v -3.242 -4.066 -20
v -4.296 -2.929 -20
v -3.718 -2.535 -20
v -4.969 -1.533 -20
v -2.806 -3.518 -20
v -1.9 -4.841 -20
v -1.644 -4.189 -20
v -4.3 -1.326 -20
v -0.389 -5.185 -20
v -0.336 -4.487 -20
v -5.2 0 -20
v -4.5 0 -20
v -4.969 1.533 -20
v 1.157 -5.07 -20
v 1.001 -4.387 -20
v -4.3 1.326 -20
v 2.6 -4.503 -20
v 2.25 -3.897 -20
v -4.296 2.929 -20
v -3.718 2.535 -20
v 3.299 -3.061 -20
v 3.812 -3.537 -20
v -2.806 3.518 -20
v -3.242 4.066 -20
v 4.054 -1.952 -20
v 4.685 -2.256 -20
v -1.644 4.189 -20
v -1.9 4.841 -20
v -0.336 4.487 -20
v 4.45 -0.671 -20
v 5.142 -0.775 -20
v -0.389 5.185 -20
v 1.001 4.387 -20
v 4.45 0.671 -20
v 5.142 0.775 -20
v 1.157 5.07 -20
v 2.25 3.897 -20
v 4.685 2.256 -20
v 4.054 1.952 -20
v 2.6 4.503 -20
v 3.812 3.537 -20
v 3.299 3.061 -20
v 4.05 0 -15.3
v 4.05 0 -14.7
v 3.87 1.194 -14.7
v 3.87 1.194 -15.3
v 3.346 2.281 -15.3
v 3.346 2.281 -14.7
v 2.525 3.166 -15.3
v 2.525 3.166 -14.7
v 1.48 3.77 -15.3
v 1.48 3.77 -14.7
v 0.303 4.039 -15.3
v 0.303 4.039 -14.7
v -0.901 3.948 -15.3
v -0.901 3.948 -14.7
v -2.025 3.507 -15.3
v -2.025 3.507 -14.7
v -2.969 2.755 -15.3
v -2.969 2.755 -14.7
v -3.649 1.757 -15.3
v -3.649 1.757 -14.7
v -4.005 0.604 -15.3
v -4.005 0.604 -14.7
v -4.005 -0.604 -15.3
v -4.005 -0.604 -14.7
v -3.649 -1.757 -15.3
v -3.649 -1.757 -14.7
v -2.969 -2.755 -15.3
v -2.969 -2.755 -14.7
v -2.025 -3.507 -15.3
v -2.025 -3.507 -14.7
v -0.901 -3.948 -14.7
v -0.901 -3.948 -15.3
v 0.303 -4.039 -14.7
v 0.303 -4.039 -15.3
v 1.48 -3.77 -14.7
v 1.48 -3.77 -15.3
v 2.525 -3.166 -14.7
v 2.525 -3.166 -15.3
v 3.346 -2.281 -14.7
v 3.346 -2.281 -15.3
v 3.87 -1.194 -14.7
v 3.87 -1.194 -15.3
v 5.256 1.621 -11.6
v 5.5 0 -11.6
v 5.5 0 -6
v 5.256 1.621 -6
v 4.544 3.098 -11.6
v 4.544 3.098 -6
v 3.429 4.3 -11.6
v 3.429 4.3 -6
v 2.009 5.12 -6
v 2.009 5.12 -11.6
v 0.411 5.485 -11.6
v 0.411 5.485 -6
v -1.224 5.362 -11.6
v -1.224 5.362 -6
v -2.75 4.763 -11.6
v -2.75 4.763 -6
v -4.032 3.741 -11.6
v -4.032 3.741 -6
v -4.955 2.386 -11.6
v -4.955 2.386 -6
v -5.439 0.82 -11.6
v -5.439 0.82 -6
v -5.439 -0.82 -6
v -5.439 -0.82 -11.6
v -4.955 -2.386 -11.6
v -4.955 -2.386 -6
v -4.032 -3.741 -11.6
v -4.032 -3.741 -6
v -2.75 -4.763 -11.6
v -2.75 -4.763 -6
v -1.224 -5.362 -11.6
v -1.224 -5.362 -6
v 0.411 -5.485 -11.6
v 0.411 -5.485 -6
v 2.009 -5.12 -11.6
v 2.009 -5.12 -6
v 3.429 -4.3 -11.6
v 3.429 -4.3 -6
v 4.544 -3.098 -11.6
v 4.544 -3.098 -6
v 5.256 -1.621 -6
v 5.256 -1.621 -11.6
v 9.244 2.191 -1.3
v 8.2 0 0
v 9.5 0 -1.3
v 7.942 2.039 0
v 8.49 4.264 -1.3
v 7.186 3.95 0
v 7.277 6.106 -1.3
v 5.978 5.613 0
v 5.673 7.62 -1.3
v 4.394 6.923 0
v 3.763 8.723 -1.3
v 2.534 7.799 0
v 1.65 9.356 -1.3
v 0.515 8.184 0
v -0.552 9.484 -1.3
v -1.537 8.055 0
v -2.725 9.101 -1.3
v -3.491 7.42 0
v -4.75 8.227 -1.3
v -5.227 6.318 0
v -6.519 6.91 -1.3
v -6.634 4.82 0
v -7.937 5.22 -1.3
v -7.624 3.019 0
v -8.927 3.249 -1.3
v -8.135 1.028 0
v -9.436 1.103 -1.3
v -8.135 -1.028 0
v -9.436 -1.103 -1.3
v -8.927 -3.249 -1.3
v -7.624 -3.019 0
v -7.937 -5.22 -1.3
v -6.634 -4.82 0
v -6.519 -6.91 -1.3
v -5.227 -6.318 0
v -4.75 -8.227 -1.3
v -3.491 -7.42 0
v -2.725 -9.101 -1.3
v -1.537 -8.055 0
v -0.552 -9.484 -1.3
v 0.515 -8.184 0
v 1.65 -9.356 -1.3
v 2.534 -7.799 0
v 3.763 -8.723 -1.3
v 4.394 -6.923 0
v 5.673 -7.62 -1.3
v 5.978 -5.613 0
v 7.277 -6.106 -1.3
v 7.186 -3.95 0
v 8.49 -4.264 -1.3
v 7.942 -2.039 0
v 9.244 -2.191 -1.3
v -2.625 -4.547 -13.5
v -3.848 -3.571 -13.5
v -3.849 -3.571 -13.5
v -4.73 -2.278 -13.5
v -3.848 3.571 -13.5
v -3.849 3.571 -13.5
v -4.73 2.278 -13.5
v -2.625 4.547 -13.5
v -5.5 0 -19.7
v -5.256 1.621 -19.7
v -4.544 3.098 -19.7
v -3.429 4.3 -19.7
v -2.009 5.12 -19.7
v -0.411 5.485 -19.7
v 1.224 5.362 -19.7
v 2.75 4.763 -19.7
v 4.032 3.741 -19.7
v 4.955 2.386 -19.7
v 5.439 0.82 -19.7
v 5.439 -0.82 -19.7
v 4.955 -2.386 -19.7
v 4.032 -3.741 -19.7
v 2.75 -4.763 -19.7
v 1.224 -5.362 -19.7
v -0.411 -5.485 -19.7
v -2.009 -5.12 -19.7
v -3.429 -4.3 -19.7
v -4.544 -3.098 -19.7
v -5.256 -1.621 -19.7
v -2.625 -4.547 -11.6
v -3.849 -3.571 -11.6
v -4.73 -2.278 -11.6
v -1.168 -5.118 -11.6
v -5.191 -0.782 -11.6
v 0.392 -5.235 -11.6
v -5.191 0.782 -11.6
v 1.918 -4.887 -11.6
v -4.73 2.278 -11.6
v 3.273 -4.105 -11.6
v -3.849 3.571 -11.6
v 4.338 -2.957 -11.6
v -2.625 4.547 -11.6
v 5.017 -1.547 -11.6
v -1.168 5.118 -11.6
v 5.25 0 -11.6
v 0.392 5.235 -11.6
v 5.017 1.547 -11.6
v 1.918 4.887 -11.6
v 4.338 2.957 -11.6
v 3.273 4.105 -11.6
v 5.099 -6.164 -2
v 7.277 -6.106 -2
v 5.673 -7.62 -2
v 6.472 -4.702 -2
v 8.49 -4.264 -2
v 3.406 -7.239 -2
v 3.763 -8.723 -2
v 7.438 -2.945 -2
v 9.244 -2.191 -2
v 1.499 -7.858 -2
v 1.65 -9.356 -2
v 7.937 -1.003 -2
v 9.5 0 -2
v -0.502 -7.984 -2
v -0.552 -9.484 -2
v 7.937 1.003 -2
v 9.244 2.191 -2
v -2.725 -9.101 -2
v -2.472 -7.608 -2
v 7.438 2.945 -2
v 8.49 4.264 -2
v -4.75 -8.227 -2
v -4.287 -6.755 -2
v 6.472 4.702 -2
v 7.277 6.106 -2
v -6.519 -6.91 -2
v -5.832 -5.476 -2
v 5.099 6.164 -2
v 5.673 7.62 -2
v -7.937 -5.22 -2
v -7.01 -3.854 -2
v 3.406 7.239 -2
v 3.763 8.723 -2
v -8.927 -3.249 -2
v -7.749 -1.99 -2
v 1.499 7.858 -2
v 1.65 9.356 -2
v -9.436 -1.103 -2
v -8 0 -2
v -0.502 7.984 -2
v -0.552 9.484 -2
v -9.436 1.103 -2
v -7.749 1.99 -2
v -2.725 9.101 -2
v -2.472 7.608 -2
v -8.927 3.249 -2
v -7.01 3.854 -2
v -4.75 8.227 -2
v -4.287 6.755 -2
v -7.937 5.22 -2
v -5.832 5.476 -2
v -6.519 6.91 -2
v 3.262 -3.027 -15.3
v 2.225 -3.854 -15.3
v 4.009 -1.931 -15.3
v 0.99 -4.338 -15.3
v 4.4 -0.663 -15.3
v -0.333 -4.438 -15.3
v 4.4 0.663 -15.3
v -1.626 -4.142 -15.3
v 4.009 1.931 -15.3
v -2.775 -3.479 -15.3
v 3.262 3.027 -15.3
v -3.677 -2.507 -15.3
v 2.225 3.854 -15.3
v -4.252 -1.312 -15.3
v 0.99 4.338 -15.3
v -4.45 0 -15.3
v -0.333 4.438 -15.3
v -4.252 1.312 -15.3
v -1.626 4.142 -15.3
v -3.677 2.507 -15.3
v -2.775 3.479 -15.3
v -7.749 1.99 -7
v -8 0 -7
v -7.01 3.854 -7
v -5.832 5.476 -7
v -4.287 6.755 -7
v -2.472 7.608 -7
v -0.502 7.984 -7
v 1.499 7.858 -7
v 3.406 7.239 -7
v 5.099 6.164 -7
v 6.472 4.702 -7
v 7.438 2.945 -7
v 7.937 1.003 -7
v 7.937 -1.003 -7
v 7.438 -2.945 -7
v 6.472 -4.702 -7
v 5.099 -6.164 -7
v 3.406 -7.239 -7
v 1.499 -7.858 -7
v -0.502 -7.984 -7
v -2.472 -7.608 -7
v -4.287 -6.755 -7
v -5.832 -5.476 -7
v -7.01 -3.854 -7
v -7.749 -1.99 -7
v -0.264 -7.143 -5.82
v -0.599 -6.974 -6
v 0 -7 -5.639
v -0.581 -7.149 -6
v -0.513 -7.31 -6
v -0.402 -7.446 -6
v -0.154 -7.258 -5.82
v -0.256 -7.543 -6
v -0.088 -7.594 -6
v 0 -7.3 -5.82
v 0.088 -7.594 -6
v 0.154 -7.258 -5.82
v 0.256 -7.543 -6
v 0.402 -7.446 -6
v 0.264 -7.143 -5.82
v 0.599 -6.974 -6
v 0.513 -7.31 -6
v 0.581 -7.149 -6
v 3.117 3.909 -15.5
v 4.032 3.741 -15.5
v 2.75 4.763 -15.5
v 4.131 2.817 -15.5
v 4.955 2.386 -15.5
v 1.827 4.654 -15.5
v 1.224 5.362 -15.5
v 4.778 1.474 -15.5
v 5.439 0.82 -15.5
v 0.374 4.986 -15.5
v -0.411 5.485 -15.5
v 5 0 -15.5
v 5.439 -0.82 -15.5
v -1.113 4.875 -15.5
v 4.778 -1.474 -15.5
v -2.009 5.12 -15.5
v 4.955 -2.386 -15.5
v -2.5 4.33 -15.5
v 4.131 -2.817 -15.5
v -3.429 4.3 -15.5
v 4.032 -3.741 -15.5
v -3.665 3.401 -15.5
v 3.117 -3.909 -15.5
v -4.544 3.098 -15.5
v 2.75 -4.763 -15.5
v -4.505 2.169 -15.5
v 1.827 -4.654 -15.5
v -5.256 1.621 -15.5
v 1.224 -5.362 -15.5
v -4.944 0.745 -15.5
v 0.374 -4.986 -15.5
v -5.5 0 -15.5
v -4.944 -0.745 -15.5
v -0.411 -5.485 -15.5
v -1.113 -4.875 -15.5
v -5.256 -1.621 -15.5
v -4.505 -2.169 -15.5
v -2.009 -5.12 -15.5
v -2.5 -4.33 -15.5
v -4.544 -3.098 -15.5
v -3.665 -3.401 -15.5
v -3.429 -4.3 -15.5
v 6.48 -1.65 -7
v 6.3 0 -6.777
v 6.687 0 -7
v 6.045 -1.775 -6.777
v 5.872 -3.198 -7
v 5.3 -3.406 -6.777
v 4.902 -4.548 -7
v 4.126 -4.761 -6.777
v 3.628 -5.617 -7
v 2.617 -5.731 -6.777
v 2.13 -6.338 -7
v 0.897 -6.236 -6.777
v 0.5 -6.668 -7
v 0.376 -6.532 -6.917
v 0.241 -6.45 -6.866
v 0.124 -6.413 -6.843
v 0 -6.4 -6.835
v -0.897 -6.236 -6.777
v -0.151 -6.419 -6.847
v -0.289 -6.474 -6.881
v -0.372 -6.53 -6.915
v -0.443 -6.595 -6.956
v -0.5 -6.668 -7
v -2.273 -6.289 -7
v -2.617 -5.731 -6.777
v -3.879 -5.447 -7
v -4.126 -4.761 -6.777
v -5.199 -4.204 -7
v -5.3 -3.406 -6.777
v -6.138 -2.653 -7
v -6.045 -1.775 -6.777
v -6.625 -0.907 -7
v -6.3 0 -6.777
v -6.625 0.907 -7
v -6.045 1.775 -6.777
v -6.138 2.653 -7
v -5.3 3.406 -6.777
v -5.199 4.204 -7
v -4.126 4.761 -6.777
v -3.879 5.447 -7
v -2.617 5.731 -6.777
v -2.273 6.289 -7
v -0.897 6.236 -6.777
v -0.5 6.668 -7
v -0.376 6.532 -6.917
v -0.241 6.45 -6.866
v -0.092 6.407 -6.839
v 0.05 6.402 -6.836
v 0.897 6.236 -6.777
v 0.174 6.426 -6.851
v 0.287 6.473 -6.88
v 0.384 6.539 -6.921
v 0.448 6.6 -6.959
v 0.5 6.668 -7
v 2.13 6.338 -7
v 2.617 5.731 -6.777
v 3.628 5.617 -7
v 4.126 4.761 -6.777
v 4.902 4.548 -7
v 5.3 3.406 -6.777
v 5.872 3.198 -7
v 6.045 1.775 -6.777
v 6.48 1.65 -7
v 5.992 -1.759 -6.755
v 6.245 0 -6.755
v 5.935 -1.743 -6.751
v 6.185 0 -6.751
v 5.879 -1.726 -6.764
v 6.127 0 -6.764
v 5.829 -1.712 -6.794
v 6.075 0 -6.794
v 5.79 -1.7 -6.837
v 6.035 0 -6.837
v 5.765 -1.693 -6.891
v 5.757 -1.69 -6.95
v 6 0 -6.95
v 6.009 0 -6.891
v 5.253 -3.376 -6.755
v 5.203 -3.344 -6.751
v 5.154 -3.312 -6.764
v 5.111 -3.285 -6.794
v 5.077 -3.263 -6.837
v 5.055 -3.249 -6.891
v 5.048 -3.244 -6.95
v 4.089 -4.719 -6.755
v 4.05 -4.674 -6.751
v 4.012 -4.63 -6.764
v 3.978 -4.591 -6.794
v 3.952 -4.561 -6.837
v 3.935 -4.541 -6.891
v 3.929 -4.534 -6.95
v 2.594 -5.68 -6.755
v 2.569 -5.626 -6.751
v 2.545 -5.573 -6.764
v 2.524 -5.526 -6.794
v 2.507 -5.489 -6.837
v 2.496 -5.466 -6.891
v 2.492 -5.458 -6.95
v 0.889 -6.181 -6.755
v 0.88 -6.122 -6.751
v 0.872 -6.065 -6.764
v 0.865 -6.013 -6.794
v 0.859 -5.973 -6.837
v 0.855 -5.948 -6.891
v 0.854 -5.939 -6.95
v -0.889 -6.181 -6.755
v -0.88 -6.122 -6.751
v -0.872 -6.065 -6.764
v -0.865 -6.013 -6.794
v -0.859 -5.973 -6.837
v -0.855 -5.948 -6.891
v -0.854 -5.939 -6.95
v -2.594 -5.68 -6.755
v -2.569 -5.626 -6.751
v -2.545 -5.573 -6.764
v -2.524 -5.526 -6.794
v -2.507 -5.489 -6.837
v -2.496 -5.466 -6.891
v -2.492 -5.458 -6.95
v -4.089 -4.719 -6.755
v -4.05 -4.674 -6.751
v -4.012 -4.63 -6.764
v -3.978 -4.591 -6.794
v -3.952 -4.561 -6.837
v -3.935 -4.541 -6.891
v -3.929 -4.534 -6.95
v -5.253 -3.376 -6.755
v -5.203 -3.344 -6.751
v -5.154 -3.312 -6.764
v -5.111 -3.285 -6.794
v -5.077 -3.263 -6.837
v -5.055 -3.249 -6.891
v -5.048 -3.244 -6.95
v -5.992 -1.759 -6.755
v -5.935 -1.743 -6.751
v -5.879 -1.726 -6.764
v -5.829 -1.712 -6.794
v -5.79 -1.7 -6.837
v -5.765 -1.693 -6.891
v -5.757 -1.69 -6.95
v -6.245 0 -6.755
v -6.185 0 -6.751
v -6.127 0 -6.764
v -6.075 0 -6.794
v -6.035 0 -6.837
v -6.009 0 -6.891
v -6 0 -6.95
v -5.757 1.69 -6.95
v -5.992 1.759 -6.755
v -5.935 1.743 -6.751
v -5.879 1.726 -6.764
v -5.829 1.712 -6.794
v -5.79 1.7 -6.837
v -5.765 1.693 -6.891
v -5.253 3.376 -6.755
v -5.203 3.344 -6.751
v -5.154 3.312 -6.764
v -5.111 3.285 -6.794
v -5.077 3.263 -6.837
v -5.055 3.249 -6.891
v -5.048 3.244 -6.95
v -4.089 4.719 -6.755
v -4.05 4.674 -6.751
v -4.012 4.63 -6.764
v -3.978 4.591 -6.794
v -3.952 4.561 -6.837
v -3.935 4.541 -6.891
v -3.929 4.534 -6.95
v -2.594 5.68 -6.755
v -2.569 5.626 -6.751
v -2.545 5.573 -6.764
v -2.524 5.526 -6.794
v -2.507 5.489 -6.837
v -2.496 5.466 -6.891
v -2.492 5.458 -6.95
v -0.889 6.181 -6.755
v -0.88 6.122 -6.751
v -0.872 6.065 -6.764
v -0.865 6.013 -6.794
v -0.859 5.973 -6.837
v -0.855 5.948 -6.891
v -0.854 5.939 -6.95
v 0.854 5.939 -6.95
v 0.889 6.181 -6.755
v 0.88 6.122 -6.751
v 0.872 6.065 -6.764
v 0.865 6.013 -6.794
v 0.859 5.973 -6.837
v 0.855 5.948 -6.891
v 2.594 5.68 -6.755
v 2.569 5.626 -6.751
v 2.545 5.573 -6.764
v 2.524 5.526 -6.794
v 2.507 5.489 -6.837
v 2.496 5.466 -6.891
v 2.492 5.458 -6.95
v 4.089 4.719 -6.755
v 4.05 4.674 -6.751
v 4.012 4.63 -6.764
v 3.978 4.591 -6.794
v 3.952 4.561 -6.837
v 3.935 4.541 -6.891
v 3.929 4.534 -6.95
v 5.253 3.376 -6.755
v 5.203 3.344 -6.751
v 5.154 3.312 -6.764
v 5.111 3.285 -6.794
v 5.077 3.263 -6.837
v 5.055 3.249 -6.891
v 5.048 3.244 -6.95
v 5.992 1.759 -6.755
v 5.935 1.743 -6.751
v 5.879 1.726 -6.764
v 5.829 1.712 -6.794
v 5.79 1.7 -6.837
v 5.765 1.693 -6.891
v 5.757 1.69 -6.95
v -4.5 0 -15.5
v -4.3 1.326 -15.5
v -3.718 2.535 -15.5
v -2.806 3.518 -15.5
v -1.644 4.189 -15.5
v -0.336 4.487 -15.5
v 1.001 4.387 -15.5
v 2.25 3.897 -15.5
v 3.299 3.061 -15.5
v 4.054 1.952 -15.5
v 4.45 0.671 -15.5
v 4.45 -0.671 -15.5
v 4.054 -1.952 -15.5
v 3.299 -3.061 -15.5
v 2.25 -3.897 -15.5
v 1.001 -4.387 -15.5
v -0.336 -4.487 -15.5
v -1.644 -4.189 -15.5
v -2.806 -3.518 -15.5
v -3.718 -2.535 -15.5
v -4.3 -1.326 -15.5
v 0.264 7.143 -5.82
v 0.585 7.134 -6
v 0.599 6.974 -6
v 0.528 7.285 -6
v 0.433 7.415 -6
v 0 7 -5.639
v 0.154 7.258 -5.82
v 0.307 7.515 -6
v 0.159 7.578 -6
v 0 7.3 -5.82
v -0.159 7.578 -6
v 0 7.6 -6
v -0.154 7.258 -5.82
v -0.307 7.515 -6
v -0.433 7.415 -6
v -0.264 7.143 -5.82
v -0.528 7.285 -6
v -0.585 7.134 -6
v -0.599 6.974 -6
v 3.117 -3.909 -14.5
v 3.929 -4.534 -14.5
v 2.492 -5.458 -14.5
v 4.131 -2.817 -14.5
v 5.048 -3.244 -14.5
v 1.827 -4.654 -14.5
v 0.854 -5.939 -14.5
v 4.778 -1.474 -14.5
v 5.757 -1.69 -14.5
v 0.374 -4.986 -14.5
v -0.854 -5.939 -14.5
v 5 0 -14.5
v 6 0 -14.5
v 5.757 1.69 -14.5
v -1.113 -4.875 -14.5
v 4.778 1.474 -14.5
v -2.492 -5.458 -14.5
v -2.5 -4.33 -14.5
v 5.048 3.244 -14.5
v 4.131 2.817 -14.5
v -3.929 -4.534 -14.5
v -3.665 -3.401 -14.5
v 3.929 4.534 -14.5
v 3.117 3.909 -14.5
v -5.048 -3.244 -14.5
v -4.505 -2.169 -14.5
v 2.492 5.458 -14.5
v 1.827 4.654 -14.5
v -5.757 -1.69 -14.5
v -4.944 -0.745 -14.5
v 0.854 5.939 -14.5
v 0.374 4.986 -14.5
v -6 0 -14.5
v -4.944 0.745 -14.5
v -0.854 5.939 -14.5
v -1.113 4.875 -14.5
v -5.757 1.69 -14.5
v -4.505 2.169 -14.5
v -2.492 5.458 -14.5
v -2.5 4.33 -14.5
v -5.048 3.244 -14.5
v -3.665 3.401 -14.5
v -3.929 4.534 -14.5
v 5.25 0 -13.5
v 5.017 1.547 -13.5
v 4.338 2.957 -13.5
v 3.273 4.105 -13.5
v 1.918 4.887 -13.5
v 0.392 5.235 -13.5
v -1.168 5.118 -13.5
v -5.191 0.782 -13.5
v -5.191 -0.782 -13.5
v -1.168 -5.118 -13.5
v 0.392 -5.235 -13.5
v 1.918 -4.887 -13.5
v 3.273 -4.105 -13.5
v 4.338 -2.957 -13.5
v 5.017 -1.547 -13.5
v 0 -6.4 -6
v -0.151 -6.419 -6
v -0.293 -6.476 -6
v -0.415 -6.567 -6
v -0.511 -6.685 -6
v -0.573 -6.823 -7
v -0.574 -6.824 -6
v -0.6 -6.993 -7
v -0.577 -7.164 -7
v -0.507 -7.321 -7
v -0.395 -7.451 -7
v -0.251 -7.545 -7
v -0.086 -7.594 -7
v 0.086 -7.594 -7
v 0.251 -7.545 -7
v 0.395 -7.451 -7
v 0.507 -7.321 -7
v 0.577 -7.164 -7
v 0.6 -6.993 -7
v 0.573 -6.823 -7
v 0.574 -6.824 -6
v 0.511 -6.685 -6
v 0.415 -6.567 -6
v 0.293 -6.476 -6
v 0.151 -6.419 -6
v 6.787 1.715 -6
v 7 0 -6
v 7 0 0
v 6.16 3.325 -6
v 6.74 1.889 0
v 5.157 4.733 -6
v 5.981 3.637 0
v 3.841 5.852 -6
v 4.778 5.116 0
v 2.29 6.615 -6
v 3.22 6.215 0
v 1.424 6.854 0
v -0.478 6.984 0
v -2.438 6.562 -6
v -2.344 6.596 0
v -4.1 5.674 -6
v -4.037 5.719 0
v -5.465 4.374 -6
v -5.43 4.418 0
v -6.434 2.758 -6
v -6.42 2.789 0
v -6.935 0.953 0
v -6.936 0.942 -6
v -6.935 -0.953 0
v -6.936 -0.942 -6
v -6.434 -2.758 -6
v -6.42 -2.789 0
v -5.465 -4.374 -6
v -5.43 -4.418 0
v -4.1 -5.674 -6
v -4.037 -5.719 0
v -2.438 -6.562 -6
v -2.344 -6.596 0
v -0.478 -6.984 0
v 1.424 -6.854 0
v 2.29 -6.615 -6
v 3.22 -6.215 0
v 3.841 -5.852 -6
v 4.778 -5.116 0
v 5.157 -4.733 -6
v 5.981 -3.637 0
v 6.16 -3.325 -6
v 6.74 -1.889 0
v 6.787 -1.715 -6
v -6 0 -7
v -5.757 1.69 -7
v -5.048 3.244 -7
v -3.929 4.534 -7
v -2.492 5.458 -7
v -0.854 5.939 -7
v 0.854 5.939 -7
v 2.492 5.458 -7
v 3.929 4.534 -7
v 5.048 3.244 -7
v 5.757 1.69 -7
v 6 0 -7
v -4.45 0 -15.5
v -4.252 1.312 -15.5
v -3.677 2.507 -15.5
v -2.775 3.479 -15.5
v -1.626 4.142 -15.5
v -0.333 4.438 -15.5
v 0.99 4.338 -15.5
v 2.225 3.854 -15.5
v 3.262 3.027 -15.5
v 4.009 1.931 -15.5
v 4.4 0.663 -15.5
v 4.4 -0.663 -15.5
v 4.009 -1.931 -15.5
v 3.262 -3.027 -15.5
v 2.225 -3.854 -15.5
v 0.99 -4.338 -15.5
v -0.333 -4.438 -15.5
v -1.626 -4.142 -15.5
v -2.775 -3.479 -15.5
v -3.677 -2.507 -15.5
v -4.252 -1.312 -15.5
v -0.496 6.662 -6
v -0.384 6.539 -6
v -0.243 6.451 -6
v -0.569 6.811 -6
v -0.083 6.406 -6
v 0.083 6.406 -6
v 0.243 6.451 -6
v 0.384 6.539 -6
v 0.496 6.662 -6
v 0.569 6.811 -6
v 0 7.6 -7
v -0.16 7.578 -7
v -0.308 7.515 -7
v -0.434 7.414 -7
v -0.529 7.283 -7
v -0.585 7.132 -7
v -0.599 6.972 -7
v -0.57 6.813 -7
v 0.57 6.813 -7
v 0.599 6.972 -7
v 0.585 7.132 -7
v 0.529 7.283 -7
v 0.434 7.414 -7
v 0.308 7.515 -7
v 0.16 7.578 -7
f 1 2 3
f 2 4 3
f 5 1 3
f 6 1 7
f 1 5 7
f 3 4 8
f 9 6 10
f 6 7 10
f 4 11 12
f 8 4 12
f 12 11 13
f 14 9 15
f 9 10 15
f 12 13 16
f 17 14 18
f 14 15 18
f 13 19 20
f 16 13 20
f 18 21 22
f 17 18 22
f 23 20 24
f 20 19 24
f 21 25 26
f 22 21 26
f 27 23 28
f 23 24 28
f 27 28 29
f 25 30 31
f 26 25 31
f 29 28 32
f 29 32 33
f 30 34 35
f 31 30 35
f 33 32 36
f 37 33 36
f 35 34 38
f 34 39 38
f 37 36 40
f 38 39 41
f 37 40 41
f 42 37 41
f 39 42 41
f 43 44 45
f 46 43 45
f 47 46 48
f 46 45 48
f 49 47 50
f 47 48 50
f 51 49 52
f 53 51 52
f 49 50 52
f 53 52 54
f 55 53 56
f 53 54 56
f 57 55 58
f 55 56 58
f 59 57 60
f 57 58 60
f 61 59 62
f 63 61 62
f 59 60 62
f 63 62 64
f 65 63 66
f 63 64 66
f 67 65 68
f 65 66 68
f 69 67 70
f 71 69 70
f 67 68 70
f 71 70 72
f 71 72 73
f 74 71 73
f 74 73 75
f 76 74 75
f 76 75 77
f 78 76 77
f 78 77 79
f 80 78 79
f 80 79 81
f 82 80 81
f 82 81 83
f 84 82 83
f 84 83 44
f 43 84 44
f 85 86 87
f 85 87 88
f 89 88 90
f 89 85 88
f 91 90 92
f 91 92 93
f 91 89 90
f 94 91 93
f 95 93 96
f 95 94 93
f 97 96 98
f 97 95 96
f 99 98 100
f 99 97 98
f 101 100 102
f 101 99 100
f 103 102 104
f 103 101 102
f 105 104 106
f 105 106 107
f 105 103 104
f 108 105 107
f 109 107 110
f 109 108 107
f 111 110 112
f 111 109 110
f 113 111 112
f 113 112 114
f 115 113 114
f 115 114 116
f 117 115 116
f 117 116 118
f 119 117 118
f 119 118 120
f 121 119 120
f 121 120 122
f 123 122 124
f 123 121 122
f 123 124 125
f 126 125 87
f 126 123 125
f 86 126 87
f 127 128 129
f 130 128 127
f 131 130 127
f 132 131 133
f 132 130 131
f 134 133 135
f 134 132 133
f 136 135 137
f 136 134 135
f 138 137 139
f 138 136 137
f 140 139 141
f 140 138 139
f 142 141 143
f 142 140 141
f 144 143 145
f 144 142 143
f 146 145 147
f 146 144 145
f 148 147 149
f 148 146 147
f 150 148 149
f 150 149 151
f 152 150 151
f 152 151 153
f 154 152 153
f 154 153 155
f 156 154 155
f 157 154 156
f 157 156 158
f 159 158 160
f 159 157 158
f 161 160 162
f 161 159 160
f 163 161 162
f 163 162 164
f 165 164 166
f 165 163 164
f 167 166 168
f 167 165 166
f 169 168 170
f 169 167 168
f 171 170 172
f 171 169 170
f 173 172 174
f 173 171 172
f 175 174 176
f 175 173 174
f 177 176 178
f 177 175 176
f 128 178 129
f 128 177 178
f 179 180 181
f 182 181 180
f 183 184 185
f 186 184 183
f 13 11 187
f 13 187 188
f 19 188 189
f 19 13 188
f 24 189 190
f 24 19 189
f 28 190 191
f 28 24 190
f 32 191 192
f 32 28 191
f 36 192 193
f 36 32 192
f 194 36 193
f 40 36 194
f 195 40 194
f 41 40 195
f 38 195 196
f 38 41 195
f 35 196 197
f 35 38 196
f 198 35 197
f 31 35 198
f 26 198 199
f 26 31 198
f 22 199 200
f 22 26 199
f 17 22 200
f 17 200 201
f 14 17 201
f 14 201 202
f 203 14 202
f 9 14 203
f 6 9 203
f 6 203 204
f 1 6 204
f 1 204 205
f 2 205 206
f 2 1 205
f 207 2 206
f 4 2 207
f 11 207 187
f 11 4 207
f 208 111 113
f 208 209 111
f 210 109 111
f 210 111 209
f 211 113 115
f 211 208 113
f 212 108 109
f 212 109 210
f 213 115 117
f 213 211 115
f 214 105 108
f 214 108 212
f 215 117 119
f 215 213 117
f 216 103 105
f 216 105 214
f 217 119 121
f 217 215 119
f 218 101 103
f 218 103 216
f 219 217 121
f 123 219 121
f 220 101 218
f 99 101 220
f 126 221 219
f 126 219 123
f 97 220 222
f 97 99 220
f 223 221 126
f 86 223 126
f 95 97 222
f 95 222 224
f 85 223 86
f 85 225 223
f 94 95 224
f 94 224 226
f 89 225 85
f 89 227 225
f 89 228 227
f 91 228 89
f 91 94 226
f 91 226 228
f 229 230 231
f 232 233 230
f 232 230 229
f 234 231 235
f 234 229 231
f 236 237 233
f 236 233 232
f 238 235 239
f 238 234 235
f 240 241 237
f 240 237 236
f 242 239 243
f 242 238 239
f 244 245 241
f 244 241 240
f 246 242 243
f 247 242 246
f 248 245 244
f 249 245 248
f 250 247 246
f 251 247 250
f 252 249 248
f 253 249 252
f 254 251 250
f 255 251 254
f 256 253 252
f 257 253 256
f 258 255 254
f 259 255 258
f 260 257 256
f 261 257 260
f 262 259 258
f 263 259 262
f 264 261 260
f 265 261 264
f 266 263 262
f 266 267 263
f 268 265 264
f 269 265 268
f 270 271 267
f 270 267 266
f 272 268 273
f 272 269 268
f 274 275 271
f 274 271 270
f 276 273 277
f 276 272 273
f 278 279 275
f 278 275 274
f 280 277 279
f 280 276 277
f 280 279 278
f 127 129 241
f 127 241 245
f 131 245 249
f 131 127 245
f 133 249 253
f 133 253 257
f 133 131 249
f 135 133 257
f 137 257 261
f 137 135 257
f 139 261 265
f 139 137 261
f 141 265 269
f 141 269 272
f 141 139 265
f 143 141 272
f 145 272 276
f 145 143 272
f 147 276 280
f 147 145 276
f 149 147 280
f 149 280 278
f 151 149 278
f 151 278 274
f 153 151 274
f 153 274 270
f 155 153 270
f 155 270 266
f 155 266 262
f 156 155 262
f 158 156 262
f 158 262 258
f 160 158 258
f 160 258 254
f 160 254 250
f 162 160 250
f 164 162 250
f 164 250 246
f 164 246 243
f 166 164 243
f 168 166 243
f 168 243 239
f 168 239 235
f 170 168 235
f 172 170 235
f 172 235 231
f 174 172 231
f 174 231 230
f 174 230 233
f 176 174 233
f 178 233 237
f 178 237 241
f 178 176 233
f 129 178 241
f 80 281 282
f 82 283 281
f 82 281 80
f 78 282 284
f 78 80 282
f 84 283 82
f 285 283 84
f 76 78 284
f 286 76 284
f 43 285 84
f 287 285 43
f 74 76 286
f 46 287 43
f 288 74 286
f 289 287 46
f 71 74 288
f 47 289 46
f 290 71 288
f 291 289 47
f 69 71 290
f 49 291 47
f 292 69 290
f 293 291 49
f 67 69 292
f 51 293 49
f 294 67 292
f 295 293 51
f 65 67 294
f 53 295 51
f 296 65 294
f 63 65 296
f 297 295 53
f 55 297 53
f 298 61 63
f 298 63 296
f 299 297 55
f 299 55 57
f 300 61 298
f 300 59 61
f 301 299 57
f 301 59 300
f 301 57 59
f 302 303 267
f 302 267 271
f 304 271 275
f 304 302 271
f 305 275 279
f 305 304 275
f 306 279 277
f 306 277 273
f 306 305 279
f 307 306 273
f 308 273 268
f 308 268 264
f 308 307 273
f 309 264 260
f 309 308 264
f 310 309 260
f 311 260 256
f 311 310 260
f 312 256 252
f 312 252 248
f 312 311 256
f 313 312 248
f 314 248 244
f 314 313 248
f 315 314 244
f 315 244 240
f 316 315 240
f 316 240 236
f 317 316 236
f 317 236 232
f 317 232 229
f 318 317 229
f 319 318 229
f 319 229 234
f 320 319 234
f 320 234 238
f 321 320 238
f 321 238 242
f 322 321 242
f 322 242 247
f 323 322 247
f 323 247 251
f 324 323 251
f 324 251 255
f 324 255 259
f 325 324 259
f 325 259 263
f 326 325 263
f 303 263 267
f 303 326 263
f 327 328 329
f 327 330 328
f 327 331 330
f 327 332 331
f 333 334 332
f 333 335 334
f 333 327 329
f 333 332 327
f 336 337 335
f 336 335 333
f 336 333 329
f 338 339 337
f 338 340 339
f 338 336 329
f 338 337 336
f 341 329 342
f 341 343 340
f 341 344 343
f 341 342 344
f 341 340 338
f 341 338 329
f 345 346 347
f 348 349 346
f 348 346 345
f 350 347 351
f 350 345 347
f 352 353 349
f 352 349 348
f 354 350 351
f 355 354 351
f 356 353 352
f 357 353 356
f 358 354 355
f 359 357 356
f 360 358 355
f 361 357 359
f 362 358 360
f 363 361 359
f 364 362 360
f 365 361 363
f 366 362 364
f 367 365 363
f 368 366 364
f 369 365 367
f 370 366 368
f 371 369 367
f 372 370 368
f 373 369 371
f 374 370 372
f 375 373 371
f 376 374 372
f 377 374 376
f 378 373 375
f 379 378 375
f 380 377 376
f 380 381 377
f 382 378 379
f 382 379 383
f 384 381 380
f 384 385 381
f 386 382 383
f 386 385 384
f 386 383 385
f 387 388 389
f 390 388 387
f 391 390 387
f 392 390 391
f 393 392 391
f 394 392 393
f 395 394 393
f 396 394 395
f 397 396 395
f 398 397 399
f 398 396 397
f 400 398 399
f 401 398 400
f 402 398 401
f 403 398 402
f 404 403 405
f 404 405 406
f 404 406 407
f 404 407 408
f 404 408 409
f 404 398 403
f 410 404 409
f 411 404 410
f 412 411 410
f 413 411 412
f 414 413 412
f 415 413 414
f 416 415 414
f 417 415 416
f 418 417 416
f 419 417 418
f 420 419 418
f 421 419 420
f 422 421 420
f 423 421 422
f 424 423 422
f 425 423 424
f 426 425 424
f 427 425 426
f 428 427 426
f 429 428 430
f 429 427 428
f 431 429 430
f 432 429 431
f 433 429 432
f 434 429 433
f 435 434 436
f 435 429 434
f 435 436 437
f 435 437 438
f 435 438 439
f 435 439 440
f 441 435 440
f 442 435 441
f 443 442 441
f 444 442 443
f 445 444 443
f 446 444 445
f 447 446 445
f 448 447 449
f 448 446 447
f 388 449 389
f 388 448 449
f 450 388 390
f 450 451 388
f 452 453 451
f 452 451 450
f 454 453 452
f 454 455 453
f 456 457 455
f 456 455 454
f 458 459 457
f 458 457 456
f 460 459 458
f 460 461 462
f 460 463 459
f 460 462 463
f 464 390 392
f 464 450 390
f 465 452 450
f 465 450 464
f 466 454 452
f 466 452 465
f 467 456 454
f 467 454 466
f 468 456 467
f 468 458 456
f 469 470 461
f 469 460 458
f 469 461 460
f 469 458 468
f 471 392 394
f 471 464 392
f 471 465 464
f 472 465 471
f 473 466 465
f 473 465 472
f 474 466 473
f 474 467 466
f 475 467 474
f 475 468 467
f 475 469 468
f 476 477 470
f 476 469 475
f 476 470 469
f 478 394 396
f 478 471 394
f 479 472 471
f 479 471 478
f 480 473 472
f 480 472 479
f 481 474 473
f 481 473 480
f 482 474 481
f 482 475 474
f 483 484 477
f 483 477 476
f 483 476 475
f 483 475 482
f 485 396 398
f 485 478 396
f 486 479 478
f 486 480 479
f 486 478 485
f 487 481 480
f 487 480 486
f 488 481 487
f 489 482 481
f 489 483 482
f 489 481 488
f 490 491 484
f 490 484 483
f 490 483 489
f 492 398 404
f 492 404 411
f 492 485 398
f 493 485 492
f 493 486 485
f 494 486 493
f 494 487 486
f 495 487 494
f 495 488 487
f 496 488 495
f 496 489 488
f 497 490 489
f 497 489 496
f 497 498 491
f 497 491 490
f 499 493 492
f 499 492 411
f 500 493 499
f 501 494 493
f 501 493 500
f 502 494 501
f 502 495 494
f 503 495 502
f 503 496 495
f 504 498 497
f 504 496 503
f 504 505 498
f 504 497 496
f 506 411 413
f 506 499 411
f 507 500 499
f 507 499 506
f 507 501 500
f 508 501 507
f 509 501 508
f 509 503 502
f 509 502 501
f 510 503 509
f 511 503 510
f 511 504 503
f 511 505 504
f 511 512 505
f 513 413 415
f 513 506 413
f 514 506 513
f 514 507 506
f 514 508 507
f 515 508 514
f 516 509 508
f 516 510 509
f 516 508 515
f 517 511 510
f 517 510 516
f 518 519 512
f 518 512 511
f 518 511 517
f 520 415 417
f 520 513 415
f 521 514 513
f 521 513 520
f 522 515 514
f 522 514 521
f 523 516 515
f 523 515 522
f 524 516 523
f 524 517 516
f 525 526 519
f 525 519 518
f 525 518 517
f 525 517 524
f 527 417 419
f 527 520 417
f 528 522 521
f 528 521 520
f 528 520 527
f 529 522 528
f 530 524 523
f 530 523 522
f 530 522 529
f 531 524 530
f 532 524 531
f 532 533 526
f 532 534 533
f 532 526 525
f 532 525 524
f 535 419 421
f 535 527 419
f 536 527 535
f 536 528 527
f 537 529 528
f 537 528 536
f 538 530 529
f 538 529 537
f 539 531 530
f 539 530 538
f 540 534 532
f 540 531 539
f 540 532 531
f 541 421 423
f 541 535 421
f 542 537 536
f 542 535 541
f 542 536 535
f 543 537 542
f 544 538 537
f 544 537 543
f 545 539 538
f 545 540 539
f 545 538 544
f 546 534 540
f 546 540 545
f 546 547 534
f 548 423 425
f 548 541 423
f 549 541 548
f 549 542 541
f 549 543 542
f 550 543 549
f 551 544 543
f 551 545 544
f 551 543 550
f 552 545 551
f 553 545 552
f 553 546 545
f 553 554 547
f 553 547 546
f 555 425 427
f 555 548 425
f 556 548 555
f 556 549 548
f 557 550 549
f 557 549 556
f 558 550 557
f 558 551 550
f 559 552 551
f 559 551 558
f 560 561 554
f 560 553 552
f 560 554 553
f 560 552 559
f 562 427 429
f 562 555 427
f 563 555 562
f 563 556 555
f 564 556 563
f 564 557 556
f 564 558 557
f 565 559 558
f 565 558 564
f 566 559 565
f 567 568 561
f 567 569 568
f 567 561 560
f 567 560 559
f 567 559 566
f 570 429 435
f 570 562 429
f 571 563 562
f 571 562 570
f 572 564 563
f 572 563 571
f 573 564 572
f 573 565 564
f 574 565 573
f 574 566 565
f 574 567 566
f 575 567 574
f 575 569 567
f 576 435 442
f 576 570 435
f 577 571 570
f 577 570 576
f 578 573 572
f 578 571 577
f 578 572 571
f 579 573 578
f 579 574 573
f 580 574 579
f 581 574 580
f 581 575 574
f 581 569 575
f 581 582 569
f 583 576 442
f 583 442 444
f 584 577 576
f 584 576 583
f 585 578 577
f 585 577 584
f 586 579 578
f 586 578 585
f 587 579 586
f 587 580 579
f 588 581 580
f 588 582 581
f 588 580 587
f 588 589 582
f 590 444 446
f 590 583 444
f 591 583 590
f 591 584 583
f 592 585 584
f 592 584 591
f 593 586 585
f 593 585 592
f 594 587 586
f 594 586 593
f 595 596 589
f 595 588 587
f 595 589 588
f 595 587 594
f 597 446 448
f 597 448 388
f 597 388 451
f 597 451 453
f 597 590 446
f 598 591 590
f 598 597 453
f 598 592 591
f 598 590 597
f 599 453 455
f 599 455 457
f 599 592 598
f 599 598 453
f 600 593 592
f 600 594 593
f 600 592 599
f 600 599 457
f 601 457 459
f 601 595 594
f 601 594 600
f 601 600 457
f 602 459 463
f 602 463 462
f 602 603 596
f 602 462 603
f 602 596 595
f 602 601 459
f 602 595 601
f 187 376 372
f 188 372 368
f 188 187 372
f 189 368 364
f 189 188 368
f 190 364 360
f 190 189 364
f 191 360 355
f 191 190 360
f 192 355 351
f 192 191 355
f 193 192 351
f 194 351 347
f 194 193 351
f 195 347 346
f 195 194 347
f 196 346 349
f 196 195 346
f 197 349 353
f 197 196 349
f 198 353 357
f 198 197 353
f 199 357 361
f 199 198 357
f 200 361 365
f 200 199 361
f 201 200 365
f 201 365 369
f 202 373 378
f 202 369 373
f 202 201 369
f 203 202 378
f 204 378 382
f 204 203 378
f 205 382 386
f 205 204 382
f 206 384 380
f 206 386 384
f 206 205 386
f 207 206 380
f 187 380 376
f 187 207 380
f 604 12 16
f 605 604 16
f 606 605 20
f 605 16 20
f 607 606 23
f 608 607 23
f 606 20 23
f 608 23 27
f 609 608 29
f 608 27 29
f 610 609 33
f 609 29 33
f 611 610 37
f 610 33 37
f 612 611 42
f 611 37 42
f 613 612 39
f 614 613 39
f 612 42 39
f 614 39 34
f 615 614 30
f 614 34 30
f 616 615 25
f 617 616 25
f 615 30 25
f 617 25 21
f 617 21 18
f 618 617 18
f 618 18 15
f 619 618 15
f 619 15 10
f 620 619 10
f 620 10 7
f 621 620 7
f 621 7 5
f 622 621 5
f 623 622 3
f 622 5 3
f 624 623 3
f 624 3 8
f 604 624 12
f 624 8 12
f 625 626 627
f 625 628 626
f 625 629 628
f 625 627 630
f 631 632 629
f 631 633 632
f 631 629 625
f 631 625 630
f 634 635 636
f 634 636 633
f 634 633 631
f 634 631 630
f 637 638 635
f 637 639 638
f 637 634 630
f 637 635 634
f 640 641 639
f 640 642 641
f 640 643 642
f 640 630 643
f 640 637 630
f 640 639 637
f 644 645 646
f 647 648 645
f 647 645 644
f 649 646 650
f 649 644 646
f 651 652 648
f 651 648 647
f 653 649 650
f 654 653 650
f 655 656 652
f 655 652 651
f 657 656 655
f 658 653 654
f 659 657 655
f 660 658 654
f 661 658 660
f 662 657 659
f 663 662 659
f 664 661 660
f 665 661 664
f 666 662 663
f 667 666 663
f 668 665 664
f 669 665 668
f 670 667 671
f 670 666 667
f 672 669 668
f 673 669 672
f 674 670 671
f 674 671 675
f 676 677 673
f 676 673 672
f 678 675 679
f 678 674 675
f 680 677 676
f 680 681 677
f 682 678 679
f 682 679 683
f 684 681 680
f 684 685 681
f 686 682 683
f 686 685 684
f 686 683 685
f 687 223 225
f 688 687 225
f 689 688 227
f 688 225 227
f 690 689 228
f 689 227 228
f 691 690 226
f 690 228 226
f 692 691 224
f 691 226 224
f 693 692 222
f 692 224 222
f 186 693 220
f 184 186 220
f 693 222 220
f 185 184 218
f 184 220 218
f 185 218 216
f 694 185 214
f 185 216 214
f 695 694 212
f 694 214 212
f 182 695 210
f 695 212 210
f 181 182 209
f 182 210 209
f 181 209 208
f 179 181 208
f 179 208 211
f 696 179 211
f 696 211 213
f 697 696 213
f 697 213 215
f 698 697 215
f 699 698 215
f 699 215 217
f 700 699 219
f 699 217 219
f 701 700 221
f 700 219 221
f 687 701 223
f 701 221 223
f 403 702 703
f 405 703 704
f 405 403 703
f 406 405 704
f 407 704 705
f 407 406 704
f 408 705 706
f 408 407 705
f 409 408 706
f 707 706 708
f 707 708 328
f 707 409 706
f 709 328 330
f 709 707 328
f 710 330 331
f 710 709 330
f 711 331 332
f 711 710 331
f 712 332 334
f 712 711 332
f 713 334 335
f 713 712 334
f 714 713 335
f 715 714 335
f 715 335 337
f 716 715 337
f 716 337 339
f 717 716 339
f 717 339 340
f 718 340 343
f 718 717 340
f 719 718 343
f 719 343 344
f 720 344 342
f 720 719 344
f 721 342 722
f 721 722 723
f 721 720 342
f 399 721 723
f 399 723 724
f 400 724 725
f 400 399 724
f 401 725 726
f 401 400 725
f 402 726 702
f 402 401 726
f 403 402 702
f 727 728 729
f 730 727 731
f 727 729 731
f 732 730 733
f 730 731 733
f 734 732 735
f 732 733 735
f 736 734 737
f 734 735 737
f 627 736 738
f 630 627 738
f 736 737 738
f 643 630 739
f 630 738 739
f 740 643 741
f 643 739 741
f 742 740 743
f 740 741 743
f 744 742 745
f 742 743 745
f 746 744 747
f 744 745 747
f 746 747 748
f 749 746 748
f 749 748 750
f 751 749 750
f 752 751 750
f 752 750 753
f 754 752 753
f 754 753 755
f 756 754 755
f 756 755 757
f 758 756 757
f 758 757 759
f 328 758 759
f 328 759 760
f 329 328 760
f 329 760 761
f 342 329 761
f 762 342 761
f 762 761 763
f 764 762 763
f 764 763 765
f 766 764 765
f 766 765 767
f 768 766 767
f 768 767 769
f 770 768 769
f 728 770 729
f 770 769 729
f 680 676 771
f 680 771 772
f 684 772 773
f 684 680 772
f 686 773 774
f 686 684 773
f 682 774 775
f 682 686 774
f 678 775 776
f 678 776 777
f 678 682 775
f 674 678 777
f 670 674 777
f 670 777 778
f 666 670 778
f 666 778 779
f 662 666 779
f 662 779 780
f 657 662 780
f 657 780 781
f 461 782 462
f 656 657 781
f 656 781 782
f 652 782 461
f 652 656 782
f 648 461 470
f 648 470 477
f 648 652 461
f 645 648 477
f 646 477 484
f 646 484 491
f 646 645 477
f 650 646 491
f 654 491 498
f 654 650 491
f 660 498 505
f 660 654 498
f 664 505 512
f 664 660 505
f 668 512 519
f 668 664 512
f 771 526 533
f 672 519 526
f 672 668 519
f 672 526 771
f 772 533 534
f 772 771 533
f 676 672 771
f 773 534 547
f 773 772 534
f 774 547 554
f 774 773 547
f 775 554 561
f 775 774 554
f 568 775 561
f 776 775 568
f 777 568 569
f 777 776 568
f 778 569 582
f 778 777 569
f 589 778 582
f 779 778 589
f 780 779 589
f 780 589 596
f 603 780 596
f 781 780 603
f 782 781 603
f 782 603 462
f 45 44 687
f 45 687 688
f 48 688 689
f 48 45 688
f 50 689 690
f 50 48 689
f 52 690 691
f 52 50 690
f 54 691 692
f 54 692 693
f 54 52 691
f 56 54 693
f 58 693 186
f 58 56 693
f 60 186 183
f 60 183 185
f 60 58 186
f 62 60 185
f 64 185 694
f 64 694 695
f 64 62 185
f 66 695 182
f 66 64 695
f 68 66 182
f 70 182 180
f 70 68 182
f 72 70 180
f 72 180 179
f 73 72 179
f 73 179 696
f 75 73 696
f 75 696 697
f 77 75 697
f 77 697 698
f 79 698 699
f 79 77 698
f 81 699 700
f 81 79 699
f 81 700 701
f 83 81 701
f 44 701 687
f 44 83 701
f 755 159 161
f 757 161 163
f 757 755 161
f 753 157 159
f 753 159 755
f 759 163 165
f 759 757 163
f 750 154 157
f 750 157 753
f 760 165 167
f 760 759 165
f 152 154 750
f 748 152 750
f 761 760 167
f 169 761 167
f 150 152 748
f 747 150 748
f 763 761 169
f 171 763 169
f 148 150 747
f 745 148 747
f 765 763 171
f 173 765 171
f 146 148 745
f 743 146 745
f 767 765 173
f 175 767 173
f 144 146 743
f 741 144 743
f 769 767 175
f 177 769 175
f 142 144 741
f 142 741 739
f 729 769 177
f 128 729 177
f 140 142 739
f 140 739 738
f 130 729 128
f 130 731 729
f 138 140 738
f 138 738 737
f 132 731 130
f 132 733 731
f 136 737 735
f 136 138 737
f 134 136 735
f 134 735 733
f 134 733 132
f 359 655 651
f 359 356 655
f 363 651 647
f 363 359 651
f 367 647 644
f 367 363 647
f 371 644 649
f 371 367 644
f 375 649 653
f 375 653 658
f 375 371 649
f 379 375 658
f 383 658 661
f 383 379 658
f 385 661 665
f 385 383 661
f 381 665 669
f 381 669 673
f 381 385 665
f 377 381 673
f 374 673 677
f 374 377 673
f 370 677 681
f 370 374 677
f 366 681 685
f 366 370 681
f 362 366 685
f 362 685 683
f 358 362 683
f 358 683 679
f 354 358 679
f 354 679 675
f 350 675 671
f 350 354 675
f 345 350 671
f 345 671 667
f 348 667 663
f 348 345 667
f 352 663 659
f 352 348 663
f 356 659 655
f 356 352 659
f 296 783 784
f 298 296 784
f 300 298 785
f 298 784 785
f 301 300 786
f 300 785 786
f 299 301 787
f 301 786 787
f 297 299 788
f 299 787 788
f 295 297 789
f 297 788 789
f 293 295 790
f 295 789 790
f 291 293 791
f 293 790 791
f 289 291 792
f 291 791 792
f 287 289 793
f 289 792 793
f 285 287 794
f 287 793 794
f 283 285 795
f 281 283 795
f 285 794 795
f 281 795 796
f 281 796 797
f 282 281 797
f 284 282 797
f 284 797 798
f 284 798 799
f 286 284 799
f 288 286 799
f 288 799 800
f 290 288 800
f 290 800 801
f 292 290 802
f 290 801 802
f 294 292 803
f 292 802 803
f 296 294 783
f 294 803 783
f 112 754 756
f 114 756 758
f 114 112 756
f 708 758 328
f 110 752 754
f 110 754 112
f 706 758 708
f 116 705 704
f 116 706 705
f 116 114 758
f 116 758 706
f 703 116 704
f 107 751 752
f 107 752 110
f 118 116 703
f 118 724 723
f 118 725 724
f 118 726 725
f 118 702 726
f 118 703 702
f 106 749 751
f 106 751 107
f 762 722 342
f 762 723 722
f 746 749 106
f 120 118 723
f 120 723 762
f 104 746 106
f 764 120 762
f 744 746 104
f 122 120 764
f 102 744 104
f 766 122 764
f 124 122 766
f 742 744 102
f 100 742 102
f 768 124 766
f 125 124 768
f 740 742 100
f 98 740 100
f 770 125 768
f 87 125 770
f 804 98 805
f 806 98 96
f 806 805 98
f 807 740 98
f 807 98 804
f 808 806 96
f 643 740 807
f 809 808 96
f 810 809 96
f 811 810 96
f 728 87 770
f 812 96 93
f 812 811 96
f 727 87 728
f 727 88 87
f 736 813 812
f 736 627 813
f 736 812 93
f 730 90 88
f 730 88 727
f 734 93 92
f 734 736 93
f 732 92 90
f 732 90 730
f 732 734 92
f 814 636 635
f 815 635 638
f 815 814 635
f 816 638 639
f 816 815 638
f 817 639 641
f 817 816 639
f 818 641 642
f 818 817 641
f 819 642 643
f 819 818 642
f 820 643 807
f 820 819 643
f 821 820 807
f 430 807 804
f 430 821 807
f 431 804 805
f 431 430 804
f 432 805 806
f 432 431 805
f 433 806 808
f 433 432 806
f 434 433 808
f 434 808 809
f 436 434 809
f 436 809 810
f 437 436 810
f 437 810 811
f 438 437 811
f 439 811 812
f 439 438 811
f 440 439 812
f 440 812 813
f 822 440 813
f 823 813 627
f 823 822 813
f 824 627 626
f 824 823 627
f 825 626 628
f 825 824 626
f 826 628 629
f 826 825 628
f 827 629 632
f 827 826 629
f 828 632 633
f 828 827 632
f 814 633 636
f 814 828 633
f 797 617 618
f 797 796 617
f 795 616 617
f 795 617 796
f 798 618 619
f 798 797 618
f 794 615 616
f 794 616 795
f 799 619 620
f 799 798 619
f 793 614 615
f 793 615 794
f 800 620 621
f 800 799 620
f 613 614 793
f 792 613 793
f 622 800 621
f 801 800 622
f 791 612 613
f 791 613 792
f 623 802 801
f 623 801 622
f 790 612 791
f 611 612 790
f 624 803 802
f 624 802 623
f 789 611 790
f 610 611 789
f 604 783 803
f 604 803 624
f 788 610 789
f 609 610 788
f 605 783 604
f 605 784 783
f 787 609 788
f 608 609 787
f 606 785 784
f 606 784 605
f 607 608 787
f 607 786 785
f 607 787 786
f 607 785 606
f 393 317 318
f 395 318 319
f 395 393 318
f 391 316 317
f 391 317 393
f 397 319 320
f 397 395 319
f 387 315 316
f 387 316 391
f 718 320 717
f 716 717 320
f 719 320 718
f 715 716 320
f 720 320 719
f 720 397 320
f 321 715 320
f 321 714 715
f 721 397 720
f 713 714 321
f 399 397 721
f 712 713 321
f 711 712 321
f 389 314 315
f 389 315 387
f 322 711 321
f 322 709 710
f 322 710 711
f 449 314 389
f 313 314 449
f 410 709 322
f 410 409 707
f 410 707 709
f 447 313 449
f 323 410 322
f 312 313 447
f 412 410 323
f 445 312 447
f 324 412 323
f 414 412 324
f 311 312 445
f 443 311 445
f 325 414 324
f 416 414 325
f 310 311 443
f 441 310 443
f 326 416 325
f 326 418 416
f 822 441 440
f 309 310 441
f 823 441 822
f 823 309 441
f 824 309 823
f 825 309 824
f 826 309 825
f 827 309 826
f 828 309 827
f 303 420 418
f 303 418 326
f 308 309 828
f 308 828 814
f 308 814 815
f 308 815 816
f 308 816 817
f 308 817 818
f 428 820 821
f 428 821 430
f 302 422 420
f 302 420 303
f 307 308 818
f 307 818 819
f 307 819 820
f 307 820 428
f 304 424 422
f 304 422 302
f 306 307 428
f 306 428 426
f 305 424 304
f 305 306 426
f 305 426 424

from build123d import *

# Parameters (mm, degrees)
SKETCH1_R                           = 9.5
BOSS_EXTRUDE1_DEPTH                 = 20
SKETCH2_OUTSIDE_W                   = 27.7
SKETCH2_OUTSIDE_H                   = 27.7
SKETCH2_OUTSIDE_R                   = 8
CUT_EXTRUDE1_DEPTH                  = 18
SKETCH3_OUTSIDE_W                   = 27.7
SKETCH3_OUTSIDE_H                   = 27.7
SKETCH3_OUTSIDE_R                   = 6
CUT_EXTRUDE2_DEPTH                  = 13
SKETCH4_OUTSIDE_W                   = 27.7
SKETCH4_OUTSIDE_H                   = 27.7
SKETCH4_OUTSIDE_R                   = 5.5
CUT_EXTRUDE3_DEPTH                  = 5.5
SKETCH5_W                           = 1
SKETCH5_H                           = 0.5
CHAMFER1_SIZE                       = 0.3
CHAMFER2_SIZE                       = 1.3
SKETCH7_R                           = 4.05
CUT_EXTRUDE4_DEPTH                  = 25.093567606
SKETCH8_R                           = 4.5
CUT_EXTRUDE5_DEPTH                  = 4.5
SKETCH9_R                           = 4.45
CUT_EXTRUDE9_DEPTH                  = 0.2
SKETCH10_R                          = 7
CUT_EXTRUDE11_DEPTH                 = 6
CUT_EXTRUDE12_START                 = -5.6
SKETCH11_R                          = 5.5
CUT_EXTRUDE12_DEPTH                 = 5.6
SKETCH12_R                          = 5.25
CUT_EXTRUDE13_DEPTH                 = 1.9
CHAMFER3_SIZE                       = 1.2
F_1_2_1_2_DIAMETER_HOLE1_AT_2_COUNT = 2
F_1_2_1_2_DIAMETER_HOLE1_AT_2_PITCH = 14


with BuildPart() as part:
    # Sketch1 → Boss-Extrude1 (new body)
    with BuildSketch(Plane.XY):
        Circle(SKETCH1_R)
    extrude(amount=-BOSS_EXTRUDE1_DEPTH)

    # Sketch2 outside → Cut-Extrude1 (cut)
    with BuildSketch(Plane(origin=(0, 0, -20), x_dir=(-1, 0, 0), z_dir=(0, 0, -1))):
        Rectangle(SKETCH2_OUTSIDE_W, SKETCH2_OUTSIDE_H)
        Circle(SKETCH2_OUTSIDE_R, mode=Mode.SUBTRACT)
    extrude(amount=-CUT_EXTRUDE1_DEPTH, mode=Mode.SUBTRACT)

    # Sketch3 outside → Cut-Extrude2 (cut)
    with BuildSketch(Plane(origin=(0, 0, -20), x_dir=(-1, 0, 0), z_dir=(0, 0, -1))):
        Rectangle(SKETCH3_OUTSIDE_W, SKETCH3_OUTSIDE_H)
        Circle(SKETCH3_OUTSIDE_R, mode=Mode.SUBTRACT)
    extrude(amount=-CUT_EXTRUDE2_DEPTH, mode=Mode.SUBTRACT)

    # Sketch4 outside → Cut-Extrude3 (cut)
    with BuildSketch(Plane(origin=(0, 0, -20), x_dir=(-1, 0, 0), z_dir=(0, 0, -1))):
        Rectangle(SKETCH4_OUTSIDE_W, SKETCH4_OUTSIDE_H)
        Circle(SKETCH4_OUTSIDE_R, mode=Mode.SUBTRACT)
    extrude(amount=-CUT_EXTRUDE3_DEPTH, mode=Mode.SUBTRACT)

    # Sketch5 → Cut-Revolve1 (revolve, cut)
    with BuildSketch(Plane(origin=(0, 0, 0), x_dir=(0, 0, -1), z_dir=(1, 0, 0)), mode=Mode.PRIVATE) as cut_revolve1_sk:
        with Locations((15, 5.25)):
            Rectangle(SKETCH5_W, SKETCH5_H)
    revolve(cut_revolve1_sk.sketch.rotate(Axis((0, 0, 0), (0, 0, -1)), 90), axis=Axis((0, 0, 0), (0, 0, -1)), mode=Mode.SUBTRACT)

    # Chamfer1
    chamfer1_edges = [part.edges().sort_by_distance(p)[0] for p in [
        (5.5, 0, -20),
    ]]
    chamfer(chamfer1_edges, length=CHAMFER1_SIZE)

    # Chamfer2
    chamfer2_edges = [part.edges().sort_by_distance(p)[0] for p in [
        (-9.5, 0, 0),
    ]]
    chamfer(chamfer2_edges, length=CHAMFER2_SIZE)

    # Sketch6 → Cut-Revolve2 (revolve, cut)
    with BuildSketch(Plane(origin=(0, 0, 0), x_dir=(0, 0, -1), z_dir=(1, 0, 0)), mode=Mode.PRIVATE) as cut_revolve2_sk:
        with BuildLine():
            Line((7.2, -7.033012702), (6.776794919, -6.3))
            ThreePointArc((6.776794919, -6.3), (6.776794919, -6.1), (6.95, -6))
            Line((6.95, -6), (7.2, -6))
            Line((7.2, -6), (7.2, -7.033012702))
        make_face()
    revolve(cut_revolve2_sk.sketch.rotate(Axis((0, 0, 0), (0, 0, -1)), 270), axis=Axis((0, 0, 0), (0, 0, -1)), mode=Mode.SUBTRACT)

    # Sketch7 → Cut-Extrude4 (cut, through all)
    with BuildSketch(Plane.XY):
        Circle(SKETCH7_R)
    extrude(amount=-CUT_EXTRUDE4_DEPTH, mode=Mode.SUBTRACT)

    # Sketch8 → Cut-Extrude5 (cut)
    with BuildSketch(Plane(origin=(0, 0, -20), x_dir=(-1, 0, 0), z_dir=(0, 0, -1))):
        Circle(SKETCH8_R)
    extrude(amount=-CUT_EXTRUDE5_DEPTH, mode=Mode.SUBTRACT)

    # Sketch9 → Cut-Extrude9 (cut)
    with BuildSketch(Plane(origin=(0, 0, -15.5), x_dir=(-1, 0, 0), z_dir=(0, 0, -1))):
        Circle(SKETCH9_R)
    extrude(amount=-CUT_EXTRUDE9_DEPTH, mode=Mode.SUBTRACT)

    # Sketch10 → Cut-Extrude11 (cut)
    with BuildSketch(Plane.XY):
        Circle(SKETCH10_R)
    extrude(amount=-CUT_EXTRUDE11_DEPTH, mode=Mode.SUBTRACT)

    # Sketch11 → Cut-Extrude12 (cut)
    with BuildSketch(Plane.XY.offset(-6).offset(CUT_EXTRUDE12_START)):
        Circle(SKETCH11_R)
    extrude(amount=CUT_EXTRUDE12_DEPTH, mode=Mode.SUBTRACT)

    # Sketch12 → Cut-Extrude13 (cut)
    with BuildSketch(Plane.XY.offset(-11.6)):
        Circle(SKETCH12_R)
    extrude(amount=-CUT_EXTRUDE13_DEPTH, mode=Mode.SUBTRACT)

    # Chamfer3
    chamfer3_edges = [part.edges().sort_by_distance(p)[0] for p in [
        (-4.05, 0, -13.5),
    ]]
    chamfer(chamfer3_edges, length=CHAMFER3_SIZE - 0.0001)  # a hair under: the kernel refuses the full size

    # Sketch15 → Ø1.2 (1.2) Diameter Hole1 (revolve, cut)
    with BuildSketch(Plane(origin=(0, -7, -7), x_dir=(0, 1, 0), z_dir=(1, 0, 0))):
        Polygon((0, 0), (0, 1.360516371), (0.6, 1), (0.6, 0), align=None)
    f_1_2_1_2_diameter_hole1 = revolve(axis=Axis((0, -7, -13.35), (0, 0, 1)), mode=Mode.SUBTRACT)

    # Ø1.2 (1.2) Diameter Hole1 at 2: Ø1.2 (1.2) Diameter Hole1 ×2
    with Locations(*[(0, i * F_1_2_1_2_DIAMETER_HOLE1_AT_2_PITCH, 0) for i in range(1, F_1_2_1_2_DIAMETER_HOLE1_AT_2_COUNT)]):
        add(f_1_2_1_2_diameter_hole1, mode=Mode.SUBTRACT)


solid = part.part
